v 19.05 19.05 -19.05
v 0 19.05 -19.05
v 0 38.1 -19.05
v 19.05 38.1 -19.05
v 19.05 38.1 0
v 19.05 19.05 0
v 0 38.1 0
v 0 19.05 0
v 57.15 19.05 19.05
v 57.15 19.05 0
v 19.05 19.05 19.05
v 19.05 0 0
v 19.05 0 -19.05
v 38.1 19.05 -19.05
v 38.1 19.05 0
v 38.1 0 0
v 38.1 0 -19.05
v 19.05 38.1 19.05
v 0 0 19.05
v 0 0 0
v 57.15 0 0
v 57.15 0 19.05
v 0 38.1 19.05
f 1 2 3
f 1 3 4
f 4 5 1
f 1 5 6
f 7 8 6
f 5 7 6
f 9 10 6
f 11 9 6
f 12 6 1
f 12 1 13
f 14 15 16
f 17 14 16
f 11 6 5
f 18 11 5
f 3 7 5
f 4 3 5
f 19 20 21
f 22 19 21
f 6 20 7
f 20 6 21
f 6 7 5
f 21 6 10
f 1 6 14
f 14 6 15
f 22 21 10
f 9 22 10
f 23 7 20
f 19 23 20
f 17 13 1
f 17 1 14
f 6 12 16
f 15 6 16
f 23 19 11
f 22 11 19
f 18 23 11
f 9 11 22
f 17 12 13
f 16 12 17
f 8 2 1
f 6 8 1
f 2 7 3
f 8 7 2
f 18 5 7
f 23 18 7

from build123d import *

# Parameters (mm, degrees)
F1_DEPTH = 19.05
F2_W     = 19.05
F2_H     = 19.05
F3_DEPTH = 19.05


with BuildPart() as f1:
    # F0 (on Top) → F1 (new body)
    with BuildSketch(Plane.XY):
        Polygon((0, 38.1), (0, 0), (57.15, 0), (57.15, 19.05), (19.05, 19.05), (19.05, 38.1), align=None)
    extrude(amount=F1_DEPTH)


with BuildPart() as f3:
    # F2 (on face) → F3 (new body)
    with BuildSketch(Plane(origin=(0, 0, 0), x_dir=(1, 0, 0), z_dir=(0, 0, -1))):
        with Locations((9.525, -28.575)):
            Rectangle(F2_W, F2_H)
        with Locations((28.575, -9.525)):
            Rectangle(F2_W, F2_H)
    extrude(amount=F3_DEPTH)


solid = Compound([f1.part, f3.part])
